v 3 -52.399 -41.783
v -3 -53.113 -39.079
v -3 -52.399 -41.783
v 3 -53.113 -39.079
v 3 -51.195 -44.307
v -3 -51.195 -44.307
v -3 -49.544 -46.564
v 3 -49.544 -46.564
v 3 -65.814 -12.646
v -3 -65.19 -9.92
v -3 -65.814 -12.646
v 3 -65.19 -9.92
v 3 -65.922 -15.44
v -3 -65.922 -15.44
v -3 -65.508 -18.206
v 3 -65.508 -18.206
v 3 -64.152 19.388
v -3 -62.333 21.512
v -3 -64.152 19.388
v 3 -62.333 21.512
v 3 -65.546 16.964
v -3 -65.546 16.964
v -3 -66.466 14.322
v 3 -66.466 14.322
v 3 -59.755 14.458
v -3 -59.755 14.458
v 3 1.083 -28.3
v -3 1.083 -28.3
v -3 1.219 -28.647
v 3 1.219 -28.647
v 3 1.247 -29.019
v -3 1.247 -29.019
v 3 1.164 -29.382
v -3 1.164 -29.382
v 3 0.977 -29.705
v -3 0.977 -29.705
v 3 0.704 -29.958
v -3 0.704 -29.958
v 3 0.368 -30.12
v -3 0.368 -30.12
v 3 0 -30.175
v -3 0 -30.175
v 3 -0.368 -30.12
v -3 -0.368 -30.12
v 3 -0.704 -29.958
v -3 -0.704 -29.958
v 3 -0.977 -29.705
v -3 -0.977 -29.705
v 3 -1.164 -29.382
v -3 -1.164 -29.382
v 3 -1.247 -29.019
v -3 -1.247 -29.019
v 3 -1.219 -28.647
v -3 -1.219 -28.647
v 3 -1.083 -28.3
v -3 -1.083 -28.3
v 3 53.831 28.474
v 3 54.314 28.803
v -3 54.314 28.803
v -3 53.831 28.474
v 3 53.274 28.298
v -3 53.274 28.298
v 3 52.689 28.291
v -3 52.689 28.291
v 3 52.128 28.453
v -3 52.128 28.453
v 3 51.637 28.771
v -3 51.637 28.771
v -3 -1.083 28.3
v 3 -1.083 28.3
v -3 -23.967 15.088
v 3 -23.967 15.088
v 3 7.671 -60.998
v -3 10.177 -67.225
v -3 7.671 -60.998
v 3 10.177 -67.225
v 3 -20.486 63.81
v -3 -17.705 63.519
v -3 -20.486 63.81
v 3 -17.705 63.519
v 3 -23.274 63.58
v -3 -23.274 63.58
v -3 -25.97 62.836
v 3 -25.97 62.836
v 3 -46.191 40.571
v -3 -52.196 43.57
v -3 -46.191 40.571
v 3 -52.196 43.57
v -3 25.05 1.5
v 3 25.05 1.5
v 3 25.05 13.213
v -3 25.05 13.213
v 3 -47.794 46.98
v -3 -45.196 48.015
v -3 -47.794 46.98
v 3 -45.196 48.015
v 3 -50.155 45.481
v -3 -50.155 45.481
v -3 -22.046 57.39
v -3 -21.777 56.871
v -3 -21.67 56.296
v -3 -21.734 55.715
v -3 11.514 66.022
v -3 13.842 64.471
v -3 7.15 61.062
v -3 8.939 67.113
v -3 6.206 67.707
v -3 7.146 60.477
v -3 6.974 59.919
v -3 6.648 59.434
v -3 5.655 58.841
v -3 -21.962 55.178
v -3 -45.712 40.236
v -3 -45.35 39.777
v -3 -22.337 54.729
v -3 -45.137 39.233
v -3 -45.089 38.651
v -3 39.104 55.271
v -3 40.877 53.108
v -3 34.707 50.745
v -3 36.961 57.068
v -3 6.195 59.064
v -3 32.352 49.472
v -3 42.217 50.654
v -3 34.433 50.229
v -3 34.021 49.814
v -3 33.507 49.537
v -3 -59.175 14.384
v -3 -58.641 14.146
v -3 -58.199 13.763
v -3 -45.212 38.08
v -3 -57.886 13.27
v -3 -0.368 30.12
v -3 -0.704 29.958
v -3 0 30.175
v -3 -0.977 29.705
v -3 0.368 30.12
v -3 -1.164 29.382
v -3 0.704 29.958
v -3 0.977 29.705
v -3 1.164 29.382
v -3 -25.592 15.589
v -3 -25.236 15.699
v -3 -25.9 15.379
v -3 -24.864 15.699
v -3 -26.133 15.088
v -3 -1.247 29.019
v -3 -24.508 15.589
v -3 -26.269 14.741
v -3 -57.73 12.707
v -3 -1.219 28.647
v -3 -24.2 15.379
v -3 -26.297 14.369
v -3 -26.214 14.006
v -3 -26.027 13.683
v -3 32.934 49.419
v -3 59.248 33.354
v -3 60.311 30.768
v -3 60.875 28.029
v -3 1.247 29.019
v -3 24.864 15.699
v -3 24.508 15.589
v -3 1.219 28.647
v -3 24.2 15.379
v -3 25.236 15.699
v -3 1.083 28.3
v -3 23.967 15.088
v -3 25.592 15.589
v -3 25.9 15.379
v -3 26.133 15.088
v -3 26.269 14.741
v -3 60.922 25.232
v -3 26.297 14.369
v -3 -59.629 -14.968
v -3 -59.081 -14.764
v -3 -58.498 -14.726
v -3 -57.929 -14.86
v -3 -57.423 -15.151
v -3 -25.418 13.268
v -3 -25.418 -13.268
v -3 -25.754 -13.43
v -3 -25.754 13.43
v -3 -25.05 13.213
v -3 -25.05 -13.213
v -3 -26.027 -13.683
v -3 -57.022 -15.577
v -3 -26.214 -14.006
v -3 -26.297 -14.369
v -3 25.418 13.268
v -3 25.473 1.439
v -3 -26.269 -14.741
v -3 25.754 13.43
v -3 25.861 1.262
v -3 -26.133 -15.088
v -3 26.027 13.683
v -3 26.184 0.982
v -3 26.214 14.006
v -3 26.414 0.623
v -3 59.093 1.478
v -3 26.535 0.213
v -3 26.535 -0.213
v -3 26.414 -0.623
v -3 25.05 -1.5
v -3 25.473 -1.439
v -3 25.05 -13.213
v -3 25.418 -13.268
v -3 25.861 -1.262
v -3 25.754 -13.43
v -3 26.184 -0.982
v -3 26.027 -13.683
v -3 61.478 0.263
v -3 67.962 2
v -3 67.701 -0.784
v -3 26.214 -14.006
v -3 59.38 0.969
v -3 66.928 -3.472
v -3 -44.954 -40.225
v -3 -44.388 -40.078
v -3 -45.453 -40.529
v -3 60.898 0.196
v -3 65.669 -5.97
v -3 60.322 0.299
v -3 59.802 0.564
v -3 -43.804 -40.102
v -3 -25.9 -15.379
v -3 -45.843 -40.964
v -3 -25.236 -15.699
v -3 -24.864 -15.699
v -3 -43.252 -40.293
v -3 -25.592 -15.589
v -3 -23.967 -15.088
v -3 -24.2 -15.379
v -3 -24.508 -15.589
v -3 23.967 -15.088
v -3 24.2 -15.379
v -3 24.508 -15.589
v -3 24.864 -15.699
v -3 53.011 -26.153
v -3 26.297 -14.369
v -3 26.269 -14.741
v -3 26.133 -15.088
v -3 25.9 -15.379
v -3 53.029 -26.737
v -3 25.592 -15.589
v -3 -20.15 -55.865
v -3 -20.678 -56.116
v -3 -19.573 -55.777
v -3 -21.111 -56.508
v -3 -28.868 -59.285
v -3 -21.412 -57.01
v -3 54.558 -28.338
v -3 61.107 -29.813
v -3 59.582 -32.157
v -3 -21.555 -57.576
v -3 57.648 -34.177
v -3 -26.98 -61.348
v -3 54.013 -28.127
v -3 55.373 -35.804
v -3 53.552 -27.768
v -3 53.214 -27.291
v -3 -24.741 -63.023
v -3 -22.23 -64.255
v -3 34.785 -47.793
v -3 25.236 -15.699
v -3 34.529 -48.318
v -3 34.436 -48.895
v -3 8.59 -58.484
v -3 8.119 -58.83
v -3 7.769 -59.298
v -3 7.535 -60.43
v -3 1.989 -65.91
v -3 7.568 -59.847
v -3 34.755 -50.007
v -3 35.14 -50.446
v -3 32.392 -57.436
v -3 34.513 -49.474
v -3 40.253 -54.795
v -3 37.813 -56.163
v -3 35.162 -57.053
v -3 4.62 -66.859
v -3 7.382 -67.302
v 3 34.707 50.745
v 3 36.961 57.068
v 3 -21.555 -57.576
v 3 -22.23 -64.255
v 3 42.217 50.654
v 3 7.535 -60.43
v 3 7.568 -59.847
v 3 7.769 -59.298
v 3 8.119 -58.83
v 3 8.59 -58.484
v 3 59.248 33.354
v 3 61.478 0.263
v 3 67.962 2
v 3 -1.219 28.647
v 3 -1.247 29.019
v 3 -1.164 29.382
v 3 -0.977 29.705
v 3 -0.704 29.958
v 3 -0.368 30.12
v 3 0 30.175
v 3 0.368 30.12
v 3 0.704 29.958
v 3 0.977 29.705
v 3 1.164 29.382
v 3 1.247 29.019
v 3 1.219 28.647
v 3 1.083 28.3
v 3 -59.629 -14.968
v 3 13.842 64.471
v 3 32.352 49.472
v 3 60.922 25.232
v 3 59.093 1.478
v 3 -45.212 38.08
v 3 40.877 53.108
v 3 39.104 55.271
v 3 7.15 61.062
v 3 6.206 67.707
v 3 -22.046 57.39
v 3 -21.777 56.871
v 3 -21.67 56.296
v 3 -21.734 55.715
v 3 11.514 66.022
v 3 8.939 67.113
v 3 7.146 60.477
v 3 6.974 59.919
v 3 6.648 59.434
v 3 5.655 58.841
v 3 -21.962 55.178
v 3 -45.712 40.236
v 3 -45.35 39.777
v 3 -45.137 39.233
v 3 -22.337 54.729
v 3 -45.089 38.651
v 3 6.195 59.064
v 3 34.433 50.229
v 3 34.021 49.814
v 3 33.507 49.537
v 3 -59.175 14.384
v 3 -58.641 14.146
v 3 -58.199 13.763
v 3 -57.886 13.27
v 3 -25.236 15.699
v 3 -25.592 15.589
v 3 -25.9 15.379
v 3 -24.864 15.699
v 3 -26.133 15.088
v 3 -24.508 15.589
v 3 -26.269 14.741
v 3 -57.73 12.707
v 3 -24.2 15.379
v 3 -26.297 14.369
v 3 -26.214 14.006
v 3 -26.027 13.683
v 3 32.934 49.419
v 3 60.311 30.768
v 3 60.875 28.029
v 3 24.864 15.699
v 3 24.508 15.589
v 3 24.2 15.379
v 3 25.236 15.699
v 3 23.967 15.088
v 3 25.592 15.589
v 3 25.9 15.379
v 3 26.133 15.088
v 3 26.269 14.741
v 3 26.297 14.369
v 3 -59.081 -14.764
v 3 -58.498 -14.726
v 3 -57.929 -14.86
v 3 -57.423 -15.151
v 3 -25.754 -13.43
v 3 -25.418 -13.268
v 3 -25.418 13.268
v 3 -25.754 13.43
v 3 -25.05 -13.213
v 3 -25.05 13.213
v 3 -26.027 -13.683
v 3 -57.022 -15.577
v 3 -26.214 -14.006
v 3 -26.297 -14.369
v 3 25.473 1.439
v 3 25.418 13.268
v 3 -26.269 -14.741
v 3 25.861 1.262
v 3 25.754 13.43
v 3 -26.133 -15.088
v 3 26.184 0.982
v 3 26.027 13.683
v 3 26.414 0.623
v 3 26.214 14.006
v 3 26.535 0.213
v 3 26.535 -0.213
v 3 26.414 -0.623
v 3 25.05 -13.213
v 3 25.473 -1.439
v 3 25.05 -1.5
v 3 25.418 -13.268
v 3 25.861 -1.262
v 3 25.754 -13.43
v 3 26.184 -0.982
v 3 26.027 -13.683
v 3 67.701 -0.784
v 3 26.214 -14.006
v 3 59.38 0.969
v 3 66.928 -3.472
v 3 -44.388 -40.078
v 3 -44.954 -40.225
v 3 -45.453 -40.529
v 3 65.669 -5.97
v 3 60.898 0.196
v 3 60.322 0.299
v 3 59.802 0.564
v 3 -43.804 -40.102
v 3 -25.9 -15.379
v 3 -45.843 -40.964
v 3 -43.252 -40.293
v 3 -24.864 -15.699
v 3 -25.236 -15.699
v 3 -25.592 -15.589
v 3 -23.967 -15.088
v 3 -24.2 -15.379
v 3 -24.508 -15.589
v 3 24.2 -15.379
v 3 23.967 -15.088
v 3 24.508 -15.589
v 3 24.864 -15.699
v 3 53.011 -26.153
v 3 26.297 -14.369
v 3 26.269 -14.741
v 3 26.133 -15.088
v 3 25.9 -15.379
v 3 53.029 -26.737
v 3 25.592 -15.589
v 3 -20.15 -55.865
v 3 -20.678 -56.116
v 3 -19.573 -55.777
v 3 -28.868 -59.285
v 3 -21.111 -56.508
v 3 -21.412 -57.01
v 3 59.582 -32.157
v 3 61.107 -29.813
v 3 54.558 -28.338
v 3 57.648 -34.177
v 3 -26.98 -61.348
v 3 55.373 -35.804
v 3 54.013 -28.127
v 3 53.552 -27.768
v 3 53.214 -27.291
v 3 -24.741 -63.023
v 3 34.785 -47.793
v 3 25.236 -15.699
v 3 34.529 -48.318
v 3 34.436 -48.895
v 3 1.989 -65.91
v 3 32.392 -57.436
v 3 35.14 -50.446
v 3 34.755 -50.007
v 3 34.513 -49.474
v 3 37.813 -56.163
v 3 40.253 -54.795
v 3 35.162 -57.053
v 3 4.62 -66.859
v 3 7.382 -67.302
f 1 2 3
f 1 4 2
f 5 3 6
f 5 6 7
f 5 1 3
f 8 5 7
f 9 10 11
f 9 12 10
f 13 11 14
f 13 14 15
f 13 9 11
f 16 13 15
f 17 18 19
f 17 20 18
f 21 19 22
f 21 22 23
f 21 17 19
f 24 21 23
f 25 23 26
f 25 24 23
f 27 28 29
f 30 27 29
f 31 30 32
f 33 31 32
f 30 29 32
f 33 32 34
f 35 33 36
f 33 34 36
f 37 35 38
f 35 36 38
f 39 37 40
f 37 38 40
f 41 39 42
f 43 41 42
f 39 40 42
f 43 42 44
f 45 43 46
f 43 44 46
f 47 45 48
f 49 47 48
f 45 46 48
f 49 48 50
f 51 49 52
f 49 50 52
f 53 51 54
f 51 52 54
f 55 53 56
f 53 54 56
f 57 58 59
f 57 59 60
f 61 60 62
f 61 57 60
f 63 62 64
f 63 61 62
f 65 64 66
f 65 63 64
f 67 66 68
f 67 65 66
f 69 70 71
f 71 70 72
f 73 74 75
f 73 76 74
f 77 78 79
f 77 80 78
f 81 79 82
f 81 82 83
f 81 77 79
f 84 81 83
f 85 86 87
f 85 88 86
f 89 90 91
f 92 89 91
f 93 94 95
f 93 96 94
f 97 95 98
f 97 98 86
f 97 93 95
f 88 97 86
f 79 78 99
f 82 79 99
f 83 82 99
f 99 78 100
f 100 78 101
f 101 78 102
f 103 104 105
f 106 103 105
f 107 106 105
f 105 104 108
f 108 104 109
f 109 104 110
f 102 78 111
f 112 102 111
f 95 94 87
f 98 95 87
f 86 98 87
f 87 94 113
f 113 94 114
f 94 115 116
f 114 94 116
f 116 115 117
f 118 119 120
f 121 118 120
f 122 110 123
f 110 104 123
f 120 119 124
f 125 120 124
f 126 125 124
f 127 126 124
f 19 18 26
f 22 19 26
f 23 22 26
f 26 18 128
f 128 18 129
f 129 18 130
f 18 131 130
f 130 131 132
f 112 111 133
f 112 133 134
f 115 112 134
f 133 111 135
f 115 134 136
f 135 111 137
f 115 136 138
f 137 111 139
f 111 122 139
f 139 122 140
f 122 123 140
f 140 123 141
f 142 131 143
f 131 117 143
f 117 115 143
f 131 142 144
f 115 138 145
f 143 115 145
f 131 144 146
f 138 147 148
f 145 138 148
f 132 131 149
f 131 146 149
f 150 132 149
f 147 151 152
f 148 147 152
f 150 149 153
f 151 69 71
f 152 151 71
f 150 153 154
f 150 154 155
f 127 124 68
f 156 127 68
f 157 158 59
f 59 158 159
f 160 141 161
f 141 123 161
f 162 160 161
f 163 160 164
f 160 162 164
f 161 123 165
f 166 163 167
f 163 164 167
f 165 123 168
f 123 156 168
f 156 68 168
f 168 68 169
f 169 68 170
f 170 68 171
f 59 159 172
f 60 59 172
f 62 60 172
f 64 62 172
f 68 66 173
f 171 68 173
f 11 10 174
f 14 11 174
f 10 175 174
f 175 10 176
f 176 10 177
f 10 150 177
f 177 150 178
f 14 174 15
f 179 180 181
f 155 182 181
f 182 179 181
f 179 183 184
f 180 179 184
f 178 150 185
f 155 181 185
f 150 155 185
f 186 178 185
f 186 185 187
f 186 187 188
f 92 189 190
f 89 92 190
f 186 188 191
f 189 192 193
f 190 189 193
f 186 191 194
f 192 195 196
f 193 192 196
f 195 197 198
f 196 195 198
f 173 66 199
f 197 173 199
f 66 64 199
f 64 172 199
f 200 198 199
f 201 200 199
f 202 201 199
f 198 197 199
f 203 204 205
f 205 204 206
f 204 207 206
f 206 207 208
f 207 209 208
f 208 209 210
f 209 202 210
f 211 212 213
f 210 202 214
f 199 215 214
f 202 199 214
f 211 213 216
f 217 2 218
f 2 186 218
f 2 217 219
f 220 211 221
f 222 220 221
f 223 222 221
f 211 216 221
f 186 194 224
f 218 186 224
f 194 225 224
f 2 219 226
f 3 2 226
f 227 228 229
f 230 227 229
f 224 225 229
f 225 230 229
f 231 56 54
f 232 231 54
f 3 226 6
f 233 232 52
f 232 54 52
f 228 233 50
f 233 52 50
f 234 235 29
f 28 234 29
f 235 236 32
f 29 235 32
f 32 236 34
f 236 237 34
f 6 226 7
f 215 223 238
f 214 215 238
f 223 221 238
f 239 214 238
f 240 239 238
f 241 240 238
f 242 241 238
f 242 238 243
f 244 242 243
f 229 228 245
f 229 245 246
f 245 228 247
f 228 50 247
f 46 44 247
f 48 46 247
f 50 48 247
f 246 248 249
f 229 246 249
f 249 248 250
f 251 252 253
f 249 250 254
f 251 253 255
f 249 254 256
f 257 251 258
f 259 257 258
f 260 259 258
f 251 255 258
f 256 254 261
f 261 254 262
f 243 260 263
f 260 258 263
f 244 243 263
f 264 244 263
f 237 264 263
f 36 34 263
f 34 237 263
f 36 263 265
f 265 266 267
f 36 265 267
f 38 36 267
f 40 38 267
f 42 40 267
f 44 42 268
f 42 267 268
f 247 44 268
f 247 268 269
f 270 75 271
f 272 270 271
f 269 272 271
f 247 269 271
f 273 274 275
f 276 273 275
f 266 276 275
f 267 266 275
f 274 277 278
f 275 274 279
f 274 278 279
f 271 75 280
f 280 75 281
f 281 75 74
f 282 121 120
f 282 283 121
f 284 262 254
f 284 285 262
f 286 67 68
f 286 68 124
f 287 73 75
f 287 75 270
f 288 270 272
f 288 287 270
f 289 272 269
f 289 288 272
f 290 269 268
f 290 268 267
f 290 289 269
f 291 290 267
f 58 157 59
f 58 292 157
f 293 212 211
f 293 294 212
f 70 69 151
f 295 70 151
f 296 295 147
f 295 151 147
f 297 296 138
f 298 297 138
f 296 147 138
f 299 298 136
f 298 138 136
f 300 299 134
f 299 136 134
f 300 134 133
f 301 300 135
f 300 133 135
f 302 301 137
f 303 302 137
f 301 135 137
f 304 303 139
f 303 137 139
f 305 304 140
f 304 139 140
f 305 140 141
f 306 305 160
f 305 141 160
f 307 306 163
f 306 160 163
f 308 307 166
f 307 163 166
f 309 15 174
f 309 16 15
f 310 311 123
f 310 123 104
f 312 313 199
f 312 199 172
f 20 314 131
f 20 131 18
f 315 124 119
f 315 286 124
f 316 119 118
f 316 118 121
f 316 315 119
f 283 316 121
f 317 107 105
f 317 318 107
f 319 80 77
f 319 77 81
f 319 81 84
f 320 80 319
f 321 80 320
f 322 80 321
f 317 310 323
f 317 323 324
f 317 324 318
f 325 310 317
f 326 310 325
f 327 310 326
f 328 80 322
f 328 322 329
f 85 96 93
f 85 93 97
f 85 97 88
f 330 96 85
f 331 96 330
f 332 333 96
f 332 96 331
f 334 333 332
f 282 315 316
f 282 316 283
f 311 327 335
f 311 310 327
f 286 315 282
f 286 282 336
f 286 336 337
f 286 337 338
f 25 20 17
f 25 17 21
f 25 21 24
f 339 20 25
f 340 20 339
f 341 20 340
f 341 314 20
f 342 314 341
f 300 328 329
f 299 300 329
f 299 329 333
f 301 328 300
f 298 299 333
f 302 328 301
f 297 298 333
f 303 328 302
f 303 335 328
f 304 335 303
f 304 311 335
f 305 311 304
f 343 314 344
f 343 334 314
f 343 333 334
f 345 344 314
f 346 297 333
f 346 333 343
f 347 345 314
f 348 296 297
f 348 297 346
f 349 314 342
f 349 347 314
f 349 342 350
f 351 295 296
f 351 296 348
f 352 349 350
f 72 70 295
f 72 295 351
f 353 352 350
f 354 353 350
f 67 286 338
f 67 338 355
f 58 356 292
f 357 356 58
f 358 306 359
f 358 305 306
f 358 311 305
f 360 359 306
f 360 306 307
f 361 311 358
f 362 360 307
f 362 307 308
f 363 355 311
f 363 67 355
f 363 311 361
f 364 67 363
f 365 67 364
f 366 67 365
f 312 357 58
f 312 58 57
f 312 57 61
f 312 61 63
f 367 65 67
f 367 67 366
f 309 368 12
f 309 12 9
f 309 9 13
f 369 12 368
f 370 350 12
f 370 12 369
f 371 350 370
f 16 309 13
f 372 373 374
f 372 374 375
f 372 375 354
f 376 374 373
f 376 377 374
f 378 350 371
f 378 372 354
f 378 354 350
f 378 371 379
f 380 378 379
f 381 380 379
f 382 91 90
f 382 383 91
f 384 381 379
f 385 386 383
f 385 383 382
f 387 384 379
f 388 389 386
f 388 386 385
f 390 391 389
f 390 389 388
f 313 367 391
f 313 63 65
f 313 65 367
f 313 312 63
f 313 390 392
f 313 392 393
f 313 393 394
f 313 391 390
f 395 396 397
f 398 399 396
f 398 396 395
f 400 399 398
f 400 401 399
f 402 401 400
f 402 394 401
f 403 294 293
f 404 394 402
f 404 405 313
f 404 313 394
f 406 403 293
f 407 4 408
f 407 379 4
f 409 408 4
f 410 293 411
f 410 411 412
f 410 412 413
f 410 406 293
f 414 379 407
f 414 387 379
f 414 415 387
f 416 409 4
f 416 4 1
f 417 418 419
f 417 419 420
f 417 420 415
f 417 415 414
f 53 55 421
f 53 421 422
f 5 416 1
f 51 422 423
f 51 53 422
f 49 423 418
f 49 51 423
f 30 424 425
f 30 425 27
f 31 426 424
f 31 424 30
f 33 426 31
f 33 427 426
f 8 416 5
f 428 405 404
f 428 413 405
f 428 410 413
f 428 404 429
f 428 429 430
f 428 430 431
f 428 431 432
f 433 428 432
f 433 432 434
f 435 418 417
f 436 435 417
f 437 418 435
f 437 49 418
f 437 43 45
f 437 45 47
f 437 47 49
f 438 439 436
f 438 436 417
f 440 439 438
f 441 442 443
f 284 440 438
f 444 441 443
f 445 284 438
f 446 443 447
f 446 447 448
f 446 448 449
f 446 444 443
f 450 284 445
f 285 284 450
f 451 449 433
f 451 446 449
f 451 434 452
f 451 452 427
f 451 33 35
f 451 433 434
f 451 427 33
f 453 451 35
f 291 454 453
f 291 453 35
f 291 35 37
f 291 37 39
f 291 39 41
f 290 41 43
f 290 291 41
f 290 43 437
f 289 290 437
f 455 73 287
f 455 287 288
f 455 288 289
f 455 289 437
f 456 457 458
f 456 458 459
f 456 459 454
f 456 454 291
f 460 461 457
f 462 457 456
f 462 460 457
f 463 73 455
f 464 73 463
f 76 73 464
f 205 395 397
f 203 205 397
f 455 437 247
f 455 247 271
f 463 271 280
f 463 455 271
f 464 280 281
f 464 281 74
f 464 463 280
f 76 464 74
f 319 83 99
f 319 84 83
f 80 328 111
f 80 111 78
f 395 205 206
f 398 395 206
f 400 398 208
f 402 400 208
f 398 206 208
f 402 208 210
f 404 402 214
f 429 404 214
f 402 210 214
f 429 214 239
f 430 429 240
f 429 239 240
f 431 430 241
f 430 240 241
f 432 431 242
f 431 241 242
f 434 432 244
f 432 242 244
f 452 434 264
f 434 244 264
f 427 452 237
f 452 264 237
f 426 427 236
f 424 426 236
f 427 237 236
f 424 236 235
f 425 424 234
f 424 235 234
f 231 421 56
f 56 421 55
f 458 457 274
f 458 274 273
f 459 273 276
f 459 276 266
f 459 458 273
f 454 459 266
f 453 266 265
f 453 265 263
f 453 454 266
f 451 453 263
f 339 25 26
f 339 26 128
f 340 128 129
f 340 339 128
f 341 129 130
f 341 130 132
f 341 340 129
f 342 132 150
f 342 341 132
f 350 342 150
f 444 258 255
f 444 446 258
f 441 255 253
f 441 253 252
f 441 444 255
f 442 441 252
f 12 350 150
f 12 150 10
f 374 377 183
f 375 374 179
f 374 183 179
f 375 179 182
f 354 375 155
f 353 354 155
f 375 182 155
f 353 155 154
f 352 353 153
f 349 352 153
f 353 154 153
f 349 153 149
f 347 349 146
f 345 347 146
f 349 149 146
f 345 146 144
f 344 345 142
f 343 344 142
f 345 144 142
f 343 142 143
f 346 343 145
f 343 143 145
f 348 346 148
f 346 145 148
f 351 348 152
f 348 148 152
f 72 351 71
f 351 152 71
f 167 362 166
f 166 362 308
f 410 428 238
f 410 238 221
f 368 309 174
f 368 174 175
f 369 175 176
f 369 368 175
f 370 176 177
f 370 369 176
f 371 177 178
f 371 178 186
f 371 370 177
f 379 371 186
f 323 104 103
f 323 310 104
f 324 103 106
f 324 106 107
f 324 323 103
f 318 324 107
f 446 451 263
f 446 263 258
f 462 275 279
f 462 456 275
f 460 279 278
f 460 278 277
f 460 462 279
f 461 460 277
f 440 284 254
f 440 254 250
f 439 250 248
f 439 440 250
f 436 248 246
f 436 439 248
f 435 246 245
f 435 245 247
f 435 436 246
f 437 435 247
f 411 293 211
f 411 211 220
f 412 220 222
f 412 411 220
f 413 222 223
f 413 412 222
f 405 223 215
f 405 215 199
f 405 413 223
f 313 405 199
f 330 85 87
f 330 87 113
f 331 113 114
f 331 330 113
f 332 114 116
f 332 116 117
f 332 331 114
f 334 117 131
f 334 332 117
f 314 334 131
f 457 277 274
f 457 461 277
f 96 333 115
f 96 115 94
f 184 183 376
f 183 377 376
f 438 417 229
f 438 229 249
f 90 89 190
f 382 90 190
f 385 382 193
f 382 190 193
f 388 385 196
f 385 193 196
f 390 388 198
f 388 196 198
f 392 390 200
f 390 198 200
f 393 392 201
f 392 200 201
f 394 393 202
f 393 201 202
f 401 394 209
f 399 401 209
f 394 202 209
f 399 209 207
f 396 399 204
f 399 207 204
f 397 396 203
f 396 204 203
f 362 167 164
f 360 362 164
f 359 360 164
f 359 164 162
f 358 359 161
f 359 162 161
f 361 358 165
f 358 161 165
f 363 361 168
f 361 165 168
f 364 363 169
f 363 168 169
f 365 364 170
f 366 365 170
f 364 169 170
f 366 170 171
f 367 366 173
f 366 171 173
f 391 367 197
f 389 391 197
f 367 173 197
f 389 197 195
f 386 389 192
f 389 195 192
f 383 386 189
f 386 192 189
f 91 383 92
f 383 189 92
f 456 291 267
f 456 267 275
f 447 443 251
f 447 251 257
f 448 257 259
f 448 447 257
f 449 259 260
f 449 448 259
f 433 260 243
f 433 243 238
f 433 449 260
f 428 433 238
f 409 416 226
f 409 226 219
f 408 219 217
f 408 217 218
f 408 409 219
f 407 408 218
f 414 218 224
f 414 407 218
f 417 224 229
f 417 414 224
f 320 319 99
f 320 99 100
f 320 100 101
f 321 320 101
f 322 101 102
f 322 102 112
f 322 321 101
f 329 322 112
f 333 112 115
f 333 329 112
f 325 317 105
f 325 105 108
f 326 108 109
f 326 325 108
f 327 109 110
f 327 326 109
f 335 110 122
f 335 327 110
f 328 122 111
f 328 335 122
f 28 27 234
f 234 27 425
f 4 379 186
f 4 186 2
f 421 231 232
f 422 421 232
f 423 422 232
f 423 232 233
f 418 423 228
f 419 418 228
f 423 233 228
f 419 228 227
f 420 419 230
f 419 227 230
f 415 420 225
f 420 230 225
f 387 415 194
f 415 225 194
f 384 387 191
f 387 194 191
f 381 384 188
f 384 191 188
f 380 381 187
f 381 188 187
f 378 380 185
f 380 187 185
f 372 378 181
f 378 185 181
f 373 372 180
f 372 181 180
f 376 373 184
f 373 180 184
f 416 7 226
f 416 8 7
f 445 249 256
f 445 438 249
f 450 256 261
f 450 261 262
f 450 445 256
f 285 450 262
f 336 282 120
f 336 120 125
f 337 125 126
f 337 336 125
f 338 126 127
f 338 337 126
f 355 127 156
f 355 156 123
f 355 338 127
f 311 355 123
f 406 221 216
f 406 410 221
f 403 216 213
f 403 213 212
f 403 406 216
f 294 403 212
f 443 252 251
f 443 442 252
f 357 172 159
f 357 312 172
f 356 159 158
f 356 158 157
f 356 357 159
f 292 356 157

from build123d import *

# Parameters (mm, degrees)
SKETCH1_R                  = 59
EXTRUDE1_DEPTH             = 3
EXTRUDE2_DEPTH             = 3
CIRPATTERN1_COUNT          = 13
F_2_5_2_5_DIAMETER_HOLE1_D = 2.5
F_3_0_3_DIAMETER_HOLE1_D   = 3


with BuildPart() as part:
    # Sketch1 → Extrude1 (new, symmetric)
    with BuildSketch(Plane(origin=(0, 0, 0), x_dir=(0, 0, -1), z_dir=(1, 0, 0))):
        Circle(SKETCH1_R)
        Polygon((14.462624243, 25.05), (-14.462624243, 25.05), (-28.925248486, 0), (-14.462624243, -25.05), (14.462624243, -25.05), (28.925248486, 0), align=None, mode=Mode.SUBTRACT)
    extrude(amount=EXTRUDE1_DEPTH, both=True)

    # Sketch2 → Extrude2 (add, symmetric)
    with BuildSketch(Plane(origin=(0, 0, 0), x_dir=(0, 0, -1), z_dir=(1, 0, 0))):
        with BuildLine():
            Line((-2, 67.961805723), (-0.262709442, 61.478149092))
            ThreePointArc((-0.262709442, 61.478149092), (-0.58620663, 59.77173183), (-2.122608272, 58.961805723))
            ThreePointArc((-2.122608272, 58.961805723), (13.210156106, 57.502102359), (27.642670176, 52.123725745))
            ThreePointArc((27.642670176, 52.123725745), (27.166811562, 52.387250915), (26.700820655, 52.667856348))
            Line((26.700820655, 52.667856348), (5.969647024, 65.669469801))
            ThreePointArc((5.969647024, 65.669469801), (2.146386308, 67.37733487), (-2, 67.961805723))
        make_face()
    extrude2 = extrude(amount=EXTRUDE2_DEPTH, both=True)

    # CirPattern1: Extrude2 ×13 about axis
    cirpattern1_axis = Axis((0, 0, 0), (1, 0, 0))
    for i in range(1, CIRPATTERN1_COUNT):
        add(extrude2.rotate(cirpattern1_axis, i * 360 / CIRPATTERN1_COUNT))

    # Ø2.5 (2.5) Diameter Hole1 (through all)
    with Locations(Plane(origin=(3, 0, 0), x_dir=(0, 0, -1), z_dir=(1, 0, 0))):
        with Locations((-14.462624243, 25.05), (14.462624243, 25.05), (28.925248486, 0), (14.462624243, -25.05), (-14.462624243, -25.05), (-28.925248486, 0)):
            Hole(F_2_5_2_5_DIAMETER_HOLE1_D / 2)

    # Ø3.0 (3) Diameter Hole1 (through all)
    with Locations(Plane(origin=(3, 0, 0), x_dir=(0, 0, -1), z_dir=(1, 0, 0))):
        with Locations((0, 25.05)):
            Hole(F_3_0_3_DIAMETER_HOLE1_D / 2)


solid = part.part
